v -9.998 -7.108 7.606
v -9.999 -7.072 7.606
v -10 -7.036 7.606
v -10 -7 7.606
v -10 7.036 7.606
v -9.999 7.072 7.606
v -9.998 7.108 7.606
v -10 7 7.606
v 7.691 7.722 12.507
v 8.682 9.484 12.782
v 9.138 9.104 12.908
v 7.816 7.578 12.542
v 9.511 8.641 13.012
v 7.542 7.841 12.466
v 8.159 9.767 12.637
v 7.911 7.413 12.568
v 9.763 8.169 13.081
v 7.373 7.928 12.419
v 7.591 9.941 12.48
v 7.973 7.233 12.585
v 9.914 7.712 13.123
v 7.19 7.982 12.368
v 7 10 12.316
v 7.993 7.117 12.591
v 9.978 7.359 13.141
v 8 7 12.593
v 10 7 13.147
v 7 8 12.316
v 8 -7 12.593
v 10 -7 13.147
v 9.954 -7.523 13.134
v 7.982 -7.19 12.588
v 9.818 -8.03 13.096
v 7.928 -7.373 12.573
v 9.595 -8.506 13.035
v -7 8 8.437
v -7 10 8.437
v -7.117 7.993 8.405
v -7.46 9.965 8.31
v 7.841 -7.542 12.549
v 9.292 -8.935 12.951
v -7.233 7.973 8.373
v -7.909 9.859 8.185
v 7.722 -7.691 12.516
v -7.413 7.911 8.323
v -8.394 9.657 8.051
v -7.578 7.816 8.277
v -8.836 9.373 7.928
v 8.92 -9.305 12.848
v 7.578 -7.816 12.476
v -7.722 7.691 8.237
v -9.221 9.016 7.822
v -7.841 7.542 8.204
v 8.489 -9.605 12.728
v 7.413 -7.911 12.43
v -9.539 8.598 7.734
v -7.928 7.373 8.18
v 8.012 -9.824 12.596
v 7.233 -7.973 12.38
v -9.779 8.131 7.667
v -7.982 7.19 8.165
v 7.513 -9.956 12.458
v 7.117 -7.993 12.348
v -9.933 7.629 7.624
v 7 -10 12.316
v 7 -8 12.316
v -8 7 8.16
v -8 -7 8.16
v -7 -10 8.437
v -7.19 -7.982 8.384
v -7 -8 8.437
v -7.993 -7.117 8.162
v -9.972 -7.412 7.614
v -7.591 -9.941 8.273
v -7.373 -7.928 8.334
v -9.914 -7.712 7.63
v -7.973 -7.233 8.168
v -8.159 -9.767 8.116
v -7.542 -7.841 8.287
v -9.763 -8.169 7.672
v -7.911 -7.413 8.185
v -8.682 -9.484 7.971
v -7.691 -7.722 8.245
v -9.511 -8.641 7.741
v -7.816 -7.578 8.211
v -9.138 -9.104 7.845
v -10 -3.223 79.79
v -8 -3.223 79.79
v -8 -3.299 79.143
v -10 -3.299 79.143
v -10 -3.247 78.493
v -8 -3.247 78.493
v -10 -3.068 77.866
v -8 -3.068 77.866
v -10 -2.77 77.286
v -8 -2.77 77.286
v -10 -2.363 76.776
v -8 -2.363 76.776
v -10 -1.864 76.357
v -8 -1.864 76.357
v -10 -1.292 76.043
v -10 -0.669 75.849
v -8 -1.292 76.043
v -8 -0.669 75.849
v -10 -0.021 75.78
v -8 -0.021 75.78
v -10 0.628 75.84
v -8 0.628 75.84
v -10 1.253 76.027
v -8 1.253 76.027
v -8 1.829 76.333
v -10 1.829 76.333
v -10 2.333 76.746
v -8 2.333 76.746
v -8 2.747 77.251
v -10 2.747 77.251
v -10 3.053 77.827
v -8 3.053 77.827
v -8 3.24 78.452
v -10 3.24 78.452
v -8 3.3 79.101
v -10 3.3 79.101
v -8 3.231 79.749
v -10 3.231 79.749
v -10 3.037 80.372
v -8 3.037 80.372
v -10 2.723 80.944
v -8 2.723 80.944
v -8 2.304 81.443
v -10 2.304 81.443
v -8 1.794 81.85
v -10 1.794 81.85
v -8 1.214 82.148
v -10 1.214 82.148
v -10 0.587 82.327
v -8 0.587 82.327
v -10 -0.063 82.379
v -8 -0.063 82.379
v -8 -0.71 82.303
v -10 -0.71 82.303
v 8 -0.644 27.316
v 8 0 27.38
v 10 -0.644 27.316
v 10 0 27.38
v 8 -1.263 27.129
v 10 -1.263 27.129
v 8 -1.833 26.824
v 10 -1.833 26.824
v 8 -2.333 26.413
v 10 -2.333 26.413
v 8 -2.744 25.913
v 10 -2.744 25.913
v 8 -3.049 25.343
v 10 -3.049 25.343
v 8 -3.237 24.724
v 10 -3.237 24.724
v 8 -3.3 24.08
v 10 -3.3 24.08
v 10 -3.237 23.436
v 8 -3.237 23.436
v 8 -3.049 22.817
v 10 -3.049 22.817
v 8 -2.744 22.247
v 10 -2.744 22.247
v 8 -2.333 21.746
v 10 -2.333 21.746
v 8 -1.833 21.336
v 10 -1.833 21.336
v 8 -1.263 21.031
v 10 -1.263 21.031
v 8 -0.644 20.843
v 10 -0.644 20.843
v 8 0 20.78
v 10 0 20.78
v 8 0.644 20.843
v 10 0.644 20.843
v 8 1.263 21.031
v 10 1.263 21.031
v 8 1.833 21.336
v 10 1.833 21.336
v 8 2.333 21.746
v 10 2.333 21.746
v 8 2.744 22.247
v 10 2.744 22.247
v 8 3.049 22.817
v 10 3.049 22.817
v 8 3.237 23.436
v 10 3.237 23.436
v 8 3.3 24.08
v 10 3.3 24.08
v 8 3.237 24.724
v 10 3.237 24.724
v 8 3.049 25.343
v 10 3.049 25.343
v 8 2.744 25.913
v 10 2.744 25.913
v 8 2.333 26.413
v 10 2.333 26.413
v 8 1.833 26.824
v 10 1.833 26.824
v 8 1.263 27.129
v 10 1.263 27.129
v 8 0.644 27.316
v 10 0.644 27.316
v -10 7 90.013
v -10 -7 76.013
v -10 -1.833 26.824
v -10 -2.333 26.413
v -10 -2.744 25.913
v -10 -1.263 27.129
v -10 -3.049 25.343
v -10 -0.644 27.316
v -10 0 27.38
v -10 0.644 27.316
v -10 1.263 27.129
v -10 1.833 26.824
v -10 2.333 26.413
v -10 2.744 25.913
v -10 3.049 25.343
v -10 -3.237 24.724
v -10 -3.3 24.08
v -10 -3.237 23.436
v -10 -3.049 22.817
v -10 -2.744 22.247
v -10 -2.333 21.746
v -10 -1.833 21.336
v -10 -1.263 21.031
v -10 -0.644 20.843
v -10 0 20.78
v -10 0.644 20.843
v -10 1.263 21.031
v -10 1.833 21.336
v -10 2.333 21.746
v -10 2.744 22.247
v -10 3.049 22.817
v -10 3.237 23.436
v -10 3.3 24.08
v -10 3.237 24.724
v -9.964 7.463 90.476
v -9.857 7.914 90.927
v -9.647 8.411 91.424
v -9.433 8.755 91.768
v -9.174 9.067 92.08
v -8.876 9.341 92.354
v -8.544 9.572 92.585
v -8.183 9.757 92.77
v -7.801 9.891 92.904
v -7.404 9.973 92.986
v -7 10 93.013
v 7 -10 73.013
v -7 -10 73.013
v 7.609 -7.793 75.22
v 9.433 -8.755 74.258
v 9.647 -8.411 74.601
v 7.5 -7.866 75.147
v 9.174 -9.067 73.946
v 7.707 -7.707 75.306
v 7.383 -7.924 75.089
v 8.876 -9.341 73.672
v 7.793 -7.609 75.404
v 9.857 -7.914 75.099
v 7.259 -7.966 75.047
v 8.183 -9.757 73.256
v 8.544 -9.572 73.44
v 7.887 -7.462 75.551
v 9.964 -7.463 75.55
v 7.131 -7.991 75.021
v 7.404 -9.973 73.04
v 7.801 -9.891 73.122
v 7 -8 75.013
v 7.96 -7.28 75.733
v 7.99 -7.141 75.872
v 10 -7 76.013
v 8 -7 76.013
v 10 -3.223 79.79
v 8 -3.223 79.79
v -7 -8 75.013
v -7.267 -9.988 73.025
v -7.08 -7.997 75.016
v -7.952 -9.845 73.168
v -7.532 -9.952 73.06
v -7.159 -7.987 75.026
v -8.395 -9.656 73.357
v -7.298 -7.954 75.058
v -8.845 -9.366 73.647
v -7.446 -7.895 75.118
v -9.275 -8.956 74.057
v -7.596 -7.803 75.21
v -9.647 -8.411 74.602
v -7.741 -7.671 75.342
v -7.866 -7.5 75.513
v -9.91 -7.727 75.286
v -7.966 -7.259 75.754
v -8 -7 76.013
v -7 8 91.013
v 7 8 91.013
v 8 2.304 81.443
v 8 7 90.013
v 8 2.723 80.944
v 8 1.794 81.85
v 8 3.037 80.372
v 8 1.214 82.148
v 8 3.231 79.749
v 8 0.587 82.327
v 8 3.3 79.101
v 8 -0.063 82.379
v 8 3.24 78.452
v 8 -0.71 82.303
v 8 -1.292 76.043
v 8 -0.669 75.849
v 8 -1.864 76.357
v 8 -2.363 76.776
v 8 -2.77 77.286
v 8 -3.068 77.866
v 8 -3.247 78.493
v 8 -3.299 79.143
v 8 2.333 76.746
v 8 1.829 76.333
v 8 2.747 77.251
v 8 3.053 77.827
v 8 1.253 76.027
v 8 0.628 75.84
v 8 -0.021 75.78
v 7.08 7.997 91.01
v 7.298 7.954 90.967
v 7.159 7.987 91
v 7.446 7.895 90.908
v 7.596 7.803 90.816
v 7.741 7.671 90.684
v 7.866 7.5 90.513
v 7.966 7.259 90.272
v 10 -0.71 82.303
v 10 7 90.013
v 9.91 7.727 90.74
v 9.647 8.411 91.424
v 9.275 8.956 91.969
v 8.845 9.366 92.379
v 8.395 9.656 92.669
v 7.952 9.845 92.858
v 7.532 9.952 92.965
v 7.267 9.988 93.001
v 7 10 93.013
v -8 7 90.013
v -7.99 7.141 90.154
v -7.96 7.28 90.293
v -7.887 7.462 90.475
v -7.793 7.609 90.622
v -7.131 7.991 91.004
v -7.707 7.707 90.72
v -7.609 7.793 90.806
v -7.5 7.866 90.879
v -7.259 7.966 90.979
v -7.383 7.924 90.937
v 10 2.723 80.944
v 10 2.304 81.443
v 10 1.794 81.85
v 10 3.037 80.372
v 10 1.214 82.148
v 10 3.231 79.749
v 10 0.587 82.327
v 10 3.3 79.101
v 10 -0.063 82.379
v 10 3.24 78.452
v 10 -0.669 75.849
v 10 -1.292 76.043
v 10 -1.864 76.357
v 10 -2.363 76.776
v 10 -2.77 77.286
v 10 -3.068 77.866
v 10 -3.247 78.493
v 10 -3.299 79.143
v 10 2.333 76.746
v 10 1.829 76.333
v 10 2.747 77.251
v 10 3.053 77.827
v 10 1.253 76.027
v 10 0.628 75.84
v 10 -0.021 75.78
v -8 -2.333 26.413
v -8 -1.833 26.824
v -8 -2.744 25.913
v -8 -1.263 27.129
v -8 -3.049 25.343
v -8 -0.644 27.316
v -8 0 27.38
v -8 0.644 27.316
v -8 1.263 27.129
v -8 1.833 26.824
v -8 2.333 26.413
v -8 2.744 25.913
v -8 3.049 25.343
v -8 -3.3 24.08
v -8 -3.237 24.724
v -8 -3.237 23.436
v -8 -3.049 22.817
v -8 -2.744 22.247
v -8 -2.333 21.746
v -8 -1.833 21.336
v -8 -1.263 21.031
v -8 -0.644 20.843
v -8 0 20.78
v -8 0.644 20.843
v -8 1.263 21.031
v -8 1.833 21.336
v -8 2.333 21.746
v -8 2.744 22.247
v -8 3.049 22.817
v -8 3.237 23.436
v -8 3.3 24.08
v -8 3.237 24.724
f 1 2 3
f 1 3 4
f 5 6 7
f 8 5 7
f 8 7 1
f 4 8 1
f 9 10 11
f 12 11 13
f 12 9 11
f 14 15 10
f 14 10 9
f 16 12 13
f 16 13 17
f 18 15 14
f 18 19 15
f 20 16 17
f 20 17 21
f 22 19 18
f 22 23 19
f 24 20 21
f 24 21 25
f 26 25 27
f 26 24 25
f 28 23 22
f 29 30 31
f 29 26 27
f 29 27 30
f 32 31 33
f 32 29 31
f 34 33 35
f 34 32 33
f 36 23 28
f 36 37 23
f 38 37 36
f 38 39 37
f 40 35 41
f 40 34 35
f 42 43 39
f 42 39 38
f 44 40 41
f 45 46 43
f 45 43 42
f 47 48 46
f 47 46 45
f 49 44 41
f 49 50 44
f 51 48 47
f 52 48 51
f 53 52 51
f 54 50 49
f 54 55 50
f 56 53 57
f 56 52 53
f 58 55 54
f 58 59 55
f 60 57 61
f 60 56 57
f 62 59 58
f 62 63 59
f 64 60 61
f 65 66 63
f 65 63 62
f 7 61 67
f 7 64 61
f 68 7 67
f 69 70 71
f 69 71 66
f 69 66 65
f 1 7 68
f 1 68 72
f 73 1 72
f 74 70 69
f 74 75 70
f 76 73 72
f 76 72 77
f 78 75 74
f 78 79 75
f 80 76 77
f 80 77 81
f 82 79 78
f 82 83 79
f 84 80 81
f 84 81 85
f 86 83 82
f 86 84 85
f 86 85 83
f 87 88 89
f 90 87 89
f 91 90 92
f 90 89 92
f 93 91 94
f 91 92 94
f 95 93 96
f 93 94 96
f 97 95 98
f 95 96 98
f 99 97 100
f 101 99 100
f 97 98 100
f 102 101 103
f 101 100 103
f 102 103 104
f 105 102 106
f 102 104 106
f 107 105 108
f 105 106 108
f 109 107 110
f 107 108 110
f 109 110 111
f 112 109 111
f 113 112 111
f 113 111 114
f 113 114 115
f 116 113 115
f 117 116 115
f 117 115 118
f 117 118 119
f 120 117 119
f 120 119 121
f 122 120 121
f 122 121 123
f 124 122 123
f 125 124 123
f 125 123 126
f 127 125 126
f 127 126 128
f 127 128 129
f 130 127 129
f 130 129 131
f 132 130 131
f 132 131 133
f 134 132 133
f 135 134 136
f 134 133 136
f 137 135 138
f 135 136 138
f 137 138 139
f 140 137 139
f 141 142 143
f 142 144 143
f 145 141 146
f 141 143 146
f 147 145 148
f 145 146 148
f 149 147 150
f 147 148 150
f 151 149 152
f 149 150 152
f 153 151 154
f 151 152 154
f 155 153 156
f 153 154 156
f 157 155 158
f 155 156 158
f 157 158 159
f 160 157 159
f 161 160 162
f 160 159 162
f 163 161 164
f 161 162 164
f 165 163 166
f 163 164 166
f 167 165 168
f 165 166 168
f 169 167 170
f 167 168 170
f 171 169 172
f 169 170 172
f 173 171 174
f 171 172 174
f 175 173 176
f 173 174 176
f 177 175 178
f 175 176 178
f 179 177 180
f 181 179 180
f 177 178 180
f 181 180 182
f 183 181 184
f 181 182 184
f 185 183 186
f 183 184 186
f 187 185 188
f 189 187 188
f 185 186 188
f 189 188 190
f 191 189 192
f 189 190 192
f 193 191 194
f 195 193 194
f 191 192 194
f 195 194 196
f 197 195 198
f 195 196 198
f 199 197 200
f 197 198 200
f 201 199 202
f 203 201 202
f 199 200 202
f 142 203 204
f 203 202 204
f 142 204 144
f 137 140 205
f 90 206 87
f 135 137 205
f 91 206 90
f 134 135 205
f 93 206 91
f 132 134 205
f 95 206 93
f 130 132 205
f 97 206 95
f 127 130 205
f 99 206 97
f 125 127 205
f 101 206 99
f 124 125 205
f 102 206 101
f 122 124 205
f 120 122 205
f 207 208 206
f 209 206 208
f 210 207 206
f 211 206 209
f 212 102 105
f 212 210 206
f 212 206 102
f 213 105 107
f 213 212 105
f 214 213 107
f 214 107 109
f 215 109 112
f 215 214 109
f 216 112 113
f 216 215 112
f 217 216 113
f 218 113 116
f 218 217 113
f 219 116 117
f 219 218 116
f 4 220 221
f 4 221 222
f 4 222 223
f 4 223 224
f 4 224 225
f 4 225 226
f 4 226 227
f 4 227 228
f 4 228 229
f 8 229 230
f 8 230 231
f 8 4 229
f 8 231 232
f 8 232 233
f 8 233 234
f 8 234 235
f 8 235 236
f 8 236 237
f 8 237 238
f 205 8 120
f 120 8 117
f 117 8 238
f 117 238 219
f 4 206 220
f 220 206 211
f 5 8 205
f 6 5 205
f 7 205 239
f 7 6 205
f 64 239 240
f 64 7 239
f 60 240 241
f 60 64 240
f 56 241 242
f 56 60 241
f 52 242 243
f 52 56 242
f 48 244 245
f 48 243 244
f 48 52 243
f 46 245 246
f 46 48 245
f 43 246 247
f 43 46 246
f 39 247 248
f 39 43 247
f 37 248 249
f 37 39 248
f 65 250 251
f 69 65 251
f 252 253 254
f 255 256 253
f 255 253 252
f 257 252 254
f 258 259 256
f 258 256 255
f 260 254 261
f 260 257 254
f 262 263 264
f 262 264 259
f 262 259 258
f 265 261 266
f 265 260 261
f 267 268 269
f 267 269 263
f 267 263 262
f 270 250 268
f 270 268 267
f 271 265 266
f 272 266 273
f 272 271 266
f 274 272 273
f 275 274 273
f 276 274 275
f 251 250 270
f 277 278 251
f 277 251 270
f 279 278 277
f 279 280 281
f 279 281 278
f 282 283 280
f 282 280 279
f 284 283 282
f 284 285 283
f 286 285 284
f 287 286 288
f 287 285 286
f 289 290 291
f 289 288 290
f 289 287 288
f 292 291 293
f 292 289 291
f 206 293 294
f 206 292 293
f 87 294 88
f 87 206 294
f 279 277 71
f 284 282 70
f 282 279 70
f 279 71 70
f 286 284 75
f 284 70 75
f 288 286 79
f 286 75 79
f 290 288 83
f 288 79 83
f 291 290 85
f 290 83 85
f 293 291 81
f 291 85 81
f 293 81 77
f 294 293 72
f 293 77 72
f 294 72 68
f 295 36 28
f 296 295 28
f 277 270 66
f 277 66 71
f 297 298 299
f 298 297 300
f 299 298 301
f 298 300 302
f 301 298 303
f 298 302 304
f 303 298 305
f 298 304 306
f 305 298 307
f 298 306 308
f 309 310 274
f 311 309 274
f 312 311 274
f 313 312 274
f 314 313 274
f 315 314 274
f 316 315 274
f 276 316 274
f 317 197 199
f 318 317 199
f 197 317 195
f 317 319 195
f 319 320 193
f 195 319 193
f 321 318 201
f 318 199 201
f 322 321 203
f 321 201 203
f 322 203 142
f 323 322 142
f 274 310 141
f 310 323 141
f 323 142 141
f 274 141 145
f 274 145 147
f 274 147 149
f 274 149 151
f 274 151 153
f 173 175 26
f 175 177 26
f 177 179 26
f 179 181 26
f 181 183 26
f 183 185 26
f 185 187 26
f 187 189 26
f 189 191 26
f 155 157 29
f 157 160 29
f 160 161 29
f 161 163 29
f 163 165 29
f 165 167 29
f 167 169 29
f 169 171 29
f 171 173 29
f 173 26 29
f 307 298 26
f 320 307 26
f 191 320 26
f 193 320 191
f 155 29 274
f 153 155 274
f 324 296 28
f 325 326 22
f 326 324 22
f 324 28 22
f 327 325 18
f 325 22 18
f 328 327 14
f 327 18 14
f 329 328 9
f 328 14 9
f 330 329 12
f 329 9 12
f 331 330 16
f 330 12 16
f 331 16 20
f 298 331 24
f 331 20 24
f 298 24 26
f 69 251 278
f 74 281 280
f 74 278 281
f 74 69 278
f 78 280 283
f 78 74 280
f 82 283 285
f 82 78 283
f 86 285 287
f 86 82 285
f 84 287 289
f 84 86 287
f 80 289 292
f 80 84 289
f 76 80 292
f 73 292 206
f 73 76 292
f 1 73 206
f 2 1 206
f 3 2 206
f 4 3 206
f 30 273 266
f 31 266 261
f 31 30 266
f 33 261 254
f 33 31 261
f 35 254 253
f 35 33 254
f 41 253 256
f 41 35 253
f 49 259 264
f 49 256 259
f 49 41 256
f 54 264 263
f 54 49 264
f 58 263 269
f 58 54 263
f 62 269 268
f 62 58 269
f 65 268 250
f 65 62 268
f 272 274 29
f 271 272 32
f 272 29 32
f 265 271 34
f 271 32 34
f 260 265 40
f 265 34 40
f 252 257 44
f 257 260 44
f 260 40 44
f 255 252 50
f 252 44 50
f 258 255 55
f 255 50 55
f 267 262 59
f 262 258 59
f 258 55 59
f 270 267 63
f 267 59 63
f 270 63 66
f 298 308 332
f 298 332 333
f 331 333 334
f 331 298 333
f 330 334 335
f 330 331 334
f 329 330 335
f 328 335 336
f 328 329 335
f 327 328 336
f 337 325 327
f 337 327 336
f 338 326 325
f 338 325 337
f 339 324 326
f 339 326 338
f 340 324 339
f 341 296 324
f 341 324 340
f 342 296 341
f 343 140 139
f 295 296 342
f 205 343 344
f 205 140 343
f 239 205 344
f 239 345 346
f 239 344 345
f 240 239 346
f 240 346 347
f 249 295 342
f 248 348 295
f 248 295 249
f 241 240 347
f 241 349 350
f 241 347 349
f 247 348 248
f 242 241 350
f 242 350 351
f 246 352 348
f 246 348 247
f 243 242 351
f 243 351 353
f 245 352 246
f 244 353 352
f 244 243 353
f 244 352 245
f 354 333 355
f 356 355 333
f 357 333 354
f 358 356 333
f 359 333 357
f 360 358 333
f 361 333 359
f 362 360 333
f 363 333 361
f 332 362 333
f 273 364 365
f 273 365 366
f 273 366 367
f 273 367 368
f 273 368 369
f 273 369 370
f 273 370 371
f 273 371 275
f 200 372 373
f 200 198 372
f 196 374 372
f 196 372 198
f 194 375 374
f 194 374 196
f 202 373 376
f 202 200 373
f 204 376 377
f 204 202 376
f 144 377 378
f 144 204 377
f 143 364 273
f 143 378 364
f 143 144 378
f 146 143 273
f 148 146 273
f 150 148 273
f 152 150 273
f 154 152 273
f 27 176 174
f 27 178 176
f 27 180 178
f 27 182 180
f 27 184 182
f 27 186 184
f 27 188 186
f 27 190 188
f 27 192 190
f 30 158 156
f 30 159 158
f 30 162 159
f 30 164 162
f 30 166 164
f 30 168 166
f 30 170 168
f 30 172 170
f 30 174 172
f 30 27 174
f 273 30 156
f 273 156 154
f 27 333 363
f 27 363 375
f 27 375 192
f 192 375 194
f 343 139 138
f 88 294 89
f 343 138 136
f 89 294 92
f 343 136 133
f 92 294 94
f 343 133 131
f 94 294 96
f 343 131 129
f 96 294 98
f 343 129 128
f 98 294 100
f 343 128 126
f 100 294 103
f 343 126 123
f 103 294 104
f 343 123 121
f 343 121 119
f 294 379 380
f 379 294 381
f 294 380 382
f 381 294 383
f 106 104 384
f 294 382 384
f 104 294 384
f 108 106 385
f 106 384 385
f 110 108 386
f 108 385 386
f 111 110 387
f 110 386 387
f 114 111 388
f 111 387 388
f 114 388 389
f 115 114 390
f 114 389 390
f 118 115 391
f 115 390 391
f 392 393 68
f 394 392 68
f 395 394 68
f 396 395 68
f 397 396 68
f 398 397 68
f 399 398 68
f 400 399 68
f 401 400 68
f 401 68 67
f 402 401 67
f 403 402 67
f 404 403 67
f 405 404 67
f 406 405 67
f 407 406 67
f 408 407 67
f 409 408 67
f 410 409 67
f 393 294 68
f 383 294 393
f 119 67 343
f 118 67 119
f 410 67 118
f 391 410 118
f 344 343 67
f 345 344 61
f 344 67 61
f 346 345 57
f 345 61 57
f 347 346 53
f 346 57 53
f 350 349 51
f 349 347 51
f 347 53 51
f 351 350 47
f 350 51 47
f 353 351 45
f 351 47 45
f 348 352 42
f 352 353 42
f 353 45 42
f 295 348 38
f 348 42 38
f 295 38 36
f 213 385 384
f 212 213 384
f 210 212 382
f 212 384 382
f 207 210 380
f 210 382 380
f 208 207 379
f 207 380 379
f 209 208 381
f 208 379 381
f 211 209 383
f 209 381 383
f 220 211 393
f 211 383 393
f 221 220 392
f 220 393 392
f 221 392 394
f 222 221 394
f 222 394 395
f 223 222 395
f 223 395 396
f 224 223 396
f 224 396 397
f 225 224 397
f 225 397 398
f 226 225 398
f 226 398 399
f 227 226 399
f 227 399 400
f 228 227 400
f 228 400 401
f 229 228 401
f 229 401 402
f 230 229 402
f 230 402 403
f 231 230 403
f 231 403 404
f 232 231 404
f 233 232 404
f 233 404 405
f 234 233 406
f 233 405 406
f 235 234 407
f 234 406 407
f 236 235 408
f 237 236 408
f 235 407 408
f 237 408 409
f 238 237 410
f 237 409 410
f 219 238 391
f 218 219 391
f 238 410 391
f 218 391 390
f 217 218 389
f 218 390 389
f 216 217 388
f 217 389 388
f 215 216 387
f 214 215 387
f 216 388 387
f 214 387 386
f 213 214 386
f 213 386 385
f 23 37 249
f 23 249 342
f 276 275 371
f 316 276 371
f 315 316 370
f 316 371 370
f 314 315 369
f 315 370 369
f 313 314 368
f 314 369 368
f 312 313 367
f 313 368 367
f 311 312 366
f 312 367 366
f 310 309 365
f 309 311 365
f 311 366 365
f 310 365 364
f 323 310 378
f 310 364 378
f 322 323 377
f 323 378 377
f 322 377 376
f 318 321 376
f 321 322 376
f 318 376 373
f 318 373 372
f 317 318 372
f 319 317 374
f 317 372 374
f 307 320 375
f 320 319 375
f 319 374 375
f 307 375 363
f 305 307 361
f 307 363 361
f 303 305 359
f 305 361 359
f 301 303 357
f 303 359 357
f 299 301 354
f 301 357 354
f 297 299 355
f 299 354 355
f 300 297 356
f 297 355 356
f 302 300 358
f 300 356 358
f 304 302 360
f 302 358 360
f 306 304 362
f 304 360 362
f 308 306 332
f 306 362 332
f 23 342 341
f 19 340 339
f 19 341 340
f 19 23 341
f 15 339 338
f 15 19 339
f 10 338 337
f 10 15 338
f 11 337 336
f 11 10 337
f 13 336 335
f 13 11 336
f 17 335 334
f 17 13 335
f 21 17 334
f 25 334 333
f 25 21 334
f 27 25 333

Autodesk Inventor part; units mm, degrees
ref_plane "Start Plane" through (0, 0, 7.6064) normal (0, 0, 1) x (1, 0, 0)
ref_plane "End Plane" through (0, 0, 93.0129) normal (0, 0, 1) x (1, 0, 0)
sketch "Sketch" plane through (0, 0, 0) normal (0, 0, 1) x (1, 0, 0)
  line L0 (-10, -7) -> (-10, 7)
  line L1 (-7, 10) -> (7, 10)
  line L2 (10, 7) -> (10, -7)
  line L3 (7, -10) -> (-7, -10)
  arc A0 (-10, -7) -> (-7, -10) centre (-7, -7) ccw
  arc A1 (-7, 10) -> (-10, 7) centre (-7, 7) ccw
  arc A2 (10, 7) -> (7, 10) centre (7, 7) ccw
  arc A3 (7, -10) -> (10, -7) centre (7, -7) ccw
  arc A4 (-7, 8) -> (-8, 7) centre (-7, 7) ccw
  line L4 (-7, 8) -> (7, 8)
  arc A5 (8, 7) -> (7, 8) centre (7, 7) ccw
  line L5 (8, 7) -> (8, -7)
  arc A6 (7, -8) -> (8, -7) centre (7, -7) ccw
  line L6 (7, -8) -> (-7, -8)
  arc A7 (-8, -7) -> (-7, -8) centre (-7, -7) ccw
  line L7 (-8, -7) -> (-8, 7)
  line L8 (0, 14.8698) -> (0, -14.8698) construction
  line L9 (-14.8698, 0) -> (14.8698, 0) construction
  dimension "d7" = 3
  dimension "d10" = 20
  dimension "d11" = 20
  dimension "d12" = 2
  dimension "d15" = 10
  dimension "d16" = 10
extrude "Body" add sketch "Sketch" along normal up to surface (85.4065 mm away) from surface at 7.6064
sketch "Sketch3" plane through (0, 0, 0) normal (0, 0, 1) x (1, 0, 0)
  line L0 (0, 0) -> (10, 0)
ref_plane "Work Plane3" through (0, 0, 0) normal (0, -1, 0) x (1, 0, 0)
sketch "Sketch4" plane through (0, 0, 0) normal (0, -1, 0) x (1, 0, 0)
  line L0 (-2, 7.6064) -> (12, 7.6064)
  line L1 (-2, 93.0129) -> (12, 93.0129)
  dimension "d18" = 85.4065
ref_plane "Work Plane5" through (4.0763, -50, 11.5058) normal (0.267, 0, -0.9637) x (-0.9637, 0, -0.267)
split "Split2" plane through (4.0763, -50, 11.5058) removes the side toward (0.267, 0, -0.9637)
ref_plane "Work Plane6" through (0, 0, 93.0129) normal (0, 0, 1) x (1, 0, 0)
split "Split3" plane through (0, 0, 93.0129) removes the side toward (0, 0, 1)
ref_plane "Work Plane7" through (0, 10, 93.0129) normal (0, -0.7071, 0.7071) x (1, 0, 0)
split "Split4" plane through (0, 10, 93.0129) removes the side toward (0, -0.7071, 0.7071)
sketch "Sketch7" plane through (8, -7, 12.5928) normal (-1, 0, 0) x (0, 0, 1)
  point P0 (11.4871, 7)
hole "Hole3" at (8, 0, 24.0799) direction (1, 0, 0) diameter 6.6 depth 2
sketch "Sketch8" plane through (8, -7, 12.5928) normal (-1, 0, 0) x (0, 0, 1)
  point P0 (66.4871, 7)
hole "Hole4" at (8, 0, 79.0799) direction (1, 0, 0) diameter 6.6 depth 2
sketch "Sketch9" plane through (-10, -7, 7.6064) normal (-1, 0, 0) x (0, 0, 1)
  point P0 (71.4735, 7)
hole "Hole5" at (-10, 0, 79.0799) direction (1, 0, 0) diameter 6.6 end through all
sketch "Sketch10" plane through (-10, -7, 7.6064) normal (-1, 0, 0) x (0, 0, 1)
  point P0 (16.4735, 7)
hole "Hole6" at (-10, 0, 24.0799) direction (1, 0, 0) diameter 6.6 end through all
equation "\"d7\" = G_IR"
equation "\"d10\" = G_H"
equation "\"d11\" = G_W"
equation "\"d12\" = G_T"
equation "\"d15\" = 0.5 * d10"
equation "\"d16\" = 0.5 * d11"
equation "\"d3\" = G_L"
equation "\"G_W\" = 20"
equation "\"G_H\" = 20"
equation "\"G_T\" = 2"
equation "\"G_IR\" = 3"
equation "\"G_L\" = d18"
equation "\"G_OFFSET_START\" = -7.60639"
equation "\"d13\" = -G_OFFSET_START"
equation "\"d14\" = G_OFFSET_END + B_L"
equation "\"B_L\" = 83.01292"
equation "\"G_OFFSET_END\" = 10"
properties part number "ISO 12633-2 - 20x20x2 - 85,41" material "Steel, Mild"
